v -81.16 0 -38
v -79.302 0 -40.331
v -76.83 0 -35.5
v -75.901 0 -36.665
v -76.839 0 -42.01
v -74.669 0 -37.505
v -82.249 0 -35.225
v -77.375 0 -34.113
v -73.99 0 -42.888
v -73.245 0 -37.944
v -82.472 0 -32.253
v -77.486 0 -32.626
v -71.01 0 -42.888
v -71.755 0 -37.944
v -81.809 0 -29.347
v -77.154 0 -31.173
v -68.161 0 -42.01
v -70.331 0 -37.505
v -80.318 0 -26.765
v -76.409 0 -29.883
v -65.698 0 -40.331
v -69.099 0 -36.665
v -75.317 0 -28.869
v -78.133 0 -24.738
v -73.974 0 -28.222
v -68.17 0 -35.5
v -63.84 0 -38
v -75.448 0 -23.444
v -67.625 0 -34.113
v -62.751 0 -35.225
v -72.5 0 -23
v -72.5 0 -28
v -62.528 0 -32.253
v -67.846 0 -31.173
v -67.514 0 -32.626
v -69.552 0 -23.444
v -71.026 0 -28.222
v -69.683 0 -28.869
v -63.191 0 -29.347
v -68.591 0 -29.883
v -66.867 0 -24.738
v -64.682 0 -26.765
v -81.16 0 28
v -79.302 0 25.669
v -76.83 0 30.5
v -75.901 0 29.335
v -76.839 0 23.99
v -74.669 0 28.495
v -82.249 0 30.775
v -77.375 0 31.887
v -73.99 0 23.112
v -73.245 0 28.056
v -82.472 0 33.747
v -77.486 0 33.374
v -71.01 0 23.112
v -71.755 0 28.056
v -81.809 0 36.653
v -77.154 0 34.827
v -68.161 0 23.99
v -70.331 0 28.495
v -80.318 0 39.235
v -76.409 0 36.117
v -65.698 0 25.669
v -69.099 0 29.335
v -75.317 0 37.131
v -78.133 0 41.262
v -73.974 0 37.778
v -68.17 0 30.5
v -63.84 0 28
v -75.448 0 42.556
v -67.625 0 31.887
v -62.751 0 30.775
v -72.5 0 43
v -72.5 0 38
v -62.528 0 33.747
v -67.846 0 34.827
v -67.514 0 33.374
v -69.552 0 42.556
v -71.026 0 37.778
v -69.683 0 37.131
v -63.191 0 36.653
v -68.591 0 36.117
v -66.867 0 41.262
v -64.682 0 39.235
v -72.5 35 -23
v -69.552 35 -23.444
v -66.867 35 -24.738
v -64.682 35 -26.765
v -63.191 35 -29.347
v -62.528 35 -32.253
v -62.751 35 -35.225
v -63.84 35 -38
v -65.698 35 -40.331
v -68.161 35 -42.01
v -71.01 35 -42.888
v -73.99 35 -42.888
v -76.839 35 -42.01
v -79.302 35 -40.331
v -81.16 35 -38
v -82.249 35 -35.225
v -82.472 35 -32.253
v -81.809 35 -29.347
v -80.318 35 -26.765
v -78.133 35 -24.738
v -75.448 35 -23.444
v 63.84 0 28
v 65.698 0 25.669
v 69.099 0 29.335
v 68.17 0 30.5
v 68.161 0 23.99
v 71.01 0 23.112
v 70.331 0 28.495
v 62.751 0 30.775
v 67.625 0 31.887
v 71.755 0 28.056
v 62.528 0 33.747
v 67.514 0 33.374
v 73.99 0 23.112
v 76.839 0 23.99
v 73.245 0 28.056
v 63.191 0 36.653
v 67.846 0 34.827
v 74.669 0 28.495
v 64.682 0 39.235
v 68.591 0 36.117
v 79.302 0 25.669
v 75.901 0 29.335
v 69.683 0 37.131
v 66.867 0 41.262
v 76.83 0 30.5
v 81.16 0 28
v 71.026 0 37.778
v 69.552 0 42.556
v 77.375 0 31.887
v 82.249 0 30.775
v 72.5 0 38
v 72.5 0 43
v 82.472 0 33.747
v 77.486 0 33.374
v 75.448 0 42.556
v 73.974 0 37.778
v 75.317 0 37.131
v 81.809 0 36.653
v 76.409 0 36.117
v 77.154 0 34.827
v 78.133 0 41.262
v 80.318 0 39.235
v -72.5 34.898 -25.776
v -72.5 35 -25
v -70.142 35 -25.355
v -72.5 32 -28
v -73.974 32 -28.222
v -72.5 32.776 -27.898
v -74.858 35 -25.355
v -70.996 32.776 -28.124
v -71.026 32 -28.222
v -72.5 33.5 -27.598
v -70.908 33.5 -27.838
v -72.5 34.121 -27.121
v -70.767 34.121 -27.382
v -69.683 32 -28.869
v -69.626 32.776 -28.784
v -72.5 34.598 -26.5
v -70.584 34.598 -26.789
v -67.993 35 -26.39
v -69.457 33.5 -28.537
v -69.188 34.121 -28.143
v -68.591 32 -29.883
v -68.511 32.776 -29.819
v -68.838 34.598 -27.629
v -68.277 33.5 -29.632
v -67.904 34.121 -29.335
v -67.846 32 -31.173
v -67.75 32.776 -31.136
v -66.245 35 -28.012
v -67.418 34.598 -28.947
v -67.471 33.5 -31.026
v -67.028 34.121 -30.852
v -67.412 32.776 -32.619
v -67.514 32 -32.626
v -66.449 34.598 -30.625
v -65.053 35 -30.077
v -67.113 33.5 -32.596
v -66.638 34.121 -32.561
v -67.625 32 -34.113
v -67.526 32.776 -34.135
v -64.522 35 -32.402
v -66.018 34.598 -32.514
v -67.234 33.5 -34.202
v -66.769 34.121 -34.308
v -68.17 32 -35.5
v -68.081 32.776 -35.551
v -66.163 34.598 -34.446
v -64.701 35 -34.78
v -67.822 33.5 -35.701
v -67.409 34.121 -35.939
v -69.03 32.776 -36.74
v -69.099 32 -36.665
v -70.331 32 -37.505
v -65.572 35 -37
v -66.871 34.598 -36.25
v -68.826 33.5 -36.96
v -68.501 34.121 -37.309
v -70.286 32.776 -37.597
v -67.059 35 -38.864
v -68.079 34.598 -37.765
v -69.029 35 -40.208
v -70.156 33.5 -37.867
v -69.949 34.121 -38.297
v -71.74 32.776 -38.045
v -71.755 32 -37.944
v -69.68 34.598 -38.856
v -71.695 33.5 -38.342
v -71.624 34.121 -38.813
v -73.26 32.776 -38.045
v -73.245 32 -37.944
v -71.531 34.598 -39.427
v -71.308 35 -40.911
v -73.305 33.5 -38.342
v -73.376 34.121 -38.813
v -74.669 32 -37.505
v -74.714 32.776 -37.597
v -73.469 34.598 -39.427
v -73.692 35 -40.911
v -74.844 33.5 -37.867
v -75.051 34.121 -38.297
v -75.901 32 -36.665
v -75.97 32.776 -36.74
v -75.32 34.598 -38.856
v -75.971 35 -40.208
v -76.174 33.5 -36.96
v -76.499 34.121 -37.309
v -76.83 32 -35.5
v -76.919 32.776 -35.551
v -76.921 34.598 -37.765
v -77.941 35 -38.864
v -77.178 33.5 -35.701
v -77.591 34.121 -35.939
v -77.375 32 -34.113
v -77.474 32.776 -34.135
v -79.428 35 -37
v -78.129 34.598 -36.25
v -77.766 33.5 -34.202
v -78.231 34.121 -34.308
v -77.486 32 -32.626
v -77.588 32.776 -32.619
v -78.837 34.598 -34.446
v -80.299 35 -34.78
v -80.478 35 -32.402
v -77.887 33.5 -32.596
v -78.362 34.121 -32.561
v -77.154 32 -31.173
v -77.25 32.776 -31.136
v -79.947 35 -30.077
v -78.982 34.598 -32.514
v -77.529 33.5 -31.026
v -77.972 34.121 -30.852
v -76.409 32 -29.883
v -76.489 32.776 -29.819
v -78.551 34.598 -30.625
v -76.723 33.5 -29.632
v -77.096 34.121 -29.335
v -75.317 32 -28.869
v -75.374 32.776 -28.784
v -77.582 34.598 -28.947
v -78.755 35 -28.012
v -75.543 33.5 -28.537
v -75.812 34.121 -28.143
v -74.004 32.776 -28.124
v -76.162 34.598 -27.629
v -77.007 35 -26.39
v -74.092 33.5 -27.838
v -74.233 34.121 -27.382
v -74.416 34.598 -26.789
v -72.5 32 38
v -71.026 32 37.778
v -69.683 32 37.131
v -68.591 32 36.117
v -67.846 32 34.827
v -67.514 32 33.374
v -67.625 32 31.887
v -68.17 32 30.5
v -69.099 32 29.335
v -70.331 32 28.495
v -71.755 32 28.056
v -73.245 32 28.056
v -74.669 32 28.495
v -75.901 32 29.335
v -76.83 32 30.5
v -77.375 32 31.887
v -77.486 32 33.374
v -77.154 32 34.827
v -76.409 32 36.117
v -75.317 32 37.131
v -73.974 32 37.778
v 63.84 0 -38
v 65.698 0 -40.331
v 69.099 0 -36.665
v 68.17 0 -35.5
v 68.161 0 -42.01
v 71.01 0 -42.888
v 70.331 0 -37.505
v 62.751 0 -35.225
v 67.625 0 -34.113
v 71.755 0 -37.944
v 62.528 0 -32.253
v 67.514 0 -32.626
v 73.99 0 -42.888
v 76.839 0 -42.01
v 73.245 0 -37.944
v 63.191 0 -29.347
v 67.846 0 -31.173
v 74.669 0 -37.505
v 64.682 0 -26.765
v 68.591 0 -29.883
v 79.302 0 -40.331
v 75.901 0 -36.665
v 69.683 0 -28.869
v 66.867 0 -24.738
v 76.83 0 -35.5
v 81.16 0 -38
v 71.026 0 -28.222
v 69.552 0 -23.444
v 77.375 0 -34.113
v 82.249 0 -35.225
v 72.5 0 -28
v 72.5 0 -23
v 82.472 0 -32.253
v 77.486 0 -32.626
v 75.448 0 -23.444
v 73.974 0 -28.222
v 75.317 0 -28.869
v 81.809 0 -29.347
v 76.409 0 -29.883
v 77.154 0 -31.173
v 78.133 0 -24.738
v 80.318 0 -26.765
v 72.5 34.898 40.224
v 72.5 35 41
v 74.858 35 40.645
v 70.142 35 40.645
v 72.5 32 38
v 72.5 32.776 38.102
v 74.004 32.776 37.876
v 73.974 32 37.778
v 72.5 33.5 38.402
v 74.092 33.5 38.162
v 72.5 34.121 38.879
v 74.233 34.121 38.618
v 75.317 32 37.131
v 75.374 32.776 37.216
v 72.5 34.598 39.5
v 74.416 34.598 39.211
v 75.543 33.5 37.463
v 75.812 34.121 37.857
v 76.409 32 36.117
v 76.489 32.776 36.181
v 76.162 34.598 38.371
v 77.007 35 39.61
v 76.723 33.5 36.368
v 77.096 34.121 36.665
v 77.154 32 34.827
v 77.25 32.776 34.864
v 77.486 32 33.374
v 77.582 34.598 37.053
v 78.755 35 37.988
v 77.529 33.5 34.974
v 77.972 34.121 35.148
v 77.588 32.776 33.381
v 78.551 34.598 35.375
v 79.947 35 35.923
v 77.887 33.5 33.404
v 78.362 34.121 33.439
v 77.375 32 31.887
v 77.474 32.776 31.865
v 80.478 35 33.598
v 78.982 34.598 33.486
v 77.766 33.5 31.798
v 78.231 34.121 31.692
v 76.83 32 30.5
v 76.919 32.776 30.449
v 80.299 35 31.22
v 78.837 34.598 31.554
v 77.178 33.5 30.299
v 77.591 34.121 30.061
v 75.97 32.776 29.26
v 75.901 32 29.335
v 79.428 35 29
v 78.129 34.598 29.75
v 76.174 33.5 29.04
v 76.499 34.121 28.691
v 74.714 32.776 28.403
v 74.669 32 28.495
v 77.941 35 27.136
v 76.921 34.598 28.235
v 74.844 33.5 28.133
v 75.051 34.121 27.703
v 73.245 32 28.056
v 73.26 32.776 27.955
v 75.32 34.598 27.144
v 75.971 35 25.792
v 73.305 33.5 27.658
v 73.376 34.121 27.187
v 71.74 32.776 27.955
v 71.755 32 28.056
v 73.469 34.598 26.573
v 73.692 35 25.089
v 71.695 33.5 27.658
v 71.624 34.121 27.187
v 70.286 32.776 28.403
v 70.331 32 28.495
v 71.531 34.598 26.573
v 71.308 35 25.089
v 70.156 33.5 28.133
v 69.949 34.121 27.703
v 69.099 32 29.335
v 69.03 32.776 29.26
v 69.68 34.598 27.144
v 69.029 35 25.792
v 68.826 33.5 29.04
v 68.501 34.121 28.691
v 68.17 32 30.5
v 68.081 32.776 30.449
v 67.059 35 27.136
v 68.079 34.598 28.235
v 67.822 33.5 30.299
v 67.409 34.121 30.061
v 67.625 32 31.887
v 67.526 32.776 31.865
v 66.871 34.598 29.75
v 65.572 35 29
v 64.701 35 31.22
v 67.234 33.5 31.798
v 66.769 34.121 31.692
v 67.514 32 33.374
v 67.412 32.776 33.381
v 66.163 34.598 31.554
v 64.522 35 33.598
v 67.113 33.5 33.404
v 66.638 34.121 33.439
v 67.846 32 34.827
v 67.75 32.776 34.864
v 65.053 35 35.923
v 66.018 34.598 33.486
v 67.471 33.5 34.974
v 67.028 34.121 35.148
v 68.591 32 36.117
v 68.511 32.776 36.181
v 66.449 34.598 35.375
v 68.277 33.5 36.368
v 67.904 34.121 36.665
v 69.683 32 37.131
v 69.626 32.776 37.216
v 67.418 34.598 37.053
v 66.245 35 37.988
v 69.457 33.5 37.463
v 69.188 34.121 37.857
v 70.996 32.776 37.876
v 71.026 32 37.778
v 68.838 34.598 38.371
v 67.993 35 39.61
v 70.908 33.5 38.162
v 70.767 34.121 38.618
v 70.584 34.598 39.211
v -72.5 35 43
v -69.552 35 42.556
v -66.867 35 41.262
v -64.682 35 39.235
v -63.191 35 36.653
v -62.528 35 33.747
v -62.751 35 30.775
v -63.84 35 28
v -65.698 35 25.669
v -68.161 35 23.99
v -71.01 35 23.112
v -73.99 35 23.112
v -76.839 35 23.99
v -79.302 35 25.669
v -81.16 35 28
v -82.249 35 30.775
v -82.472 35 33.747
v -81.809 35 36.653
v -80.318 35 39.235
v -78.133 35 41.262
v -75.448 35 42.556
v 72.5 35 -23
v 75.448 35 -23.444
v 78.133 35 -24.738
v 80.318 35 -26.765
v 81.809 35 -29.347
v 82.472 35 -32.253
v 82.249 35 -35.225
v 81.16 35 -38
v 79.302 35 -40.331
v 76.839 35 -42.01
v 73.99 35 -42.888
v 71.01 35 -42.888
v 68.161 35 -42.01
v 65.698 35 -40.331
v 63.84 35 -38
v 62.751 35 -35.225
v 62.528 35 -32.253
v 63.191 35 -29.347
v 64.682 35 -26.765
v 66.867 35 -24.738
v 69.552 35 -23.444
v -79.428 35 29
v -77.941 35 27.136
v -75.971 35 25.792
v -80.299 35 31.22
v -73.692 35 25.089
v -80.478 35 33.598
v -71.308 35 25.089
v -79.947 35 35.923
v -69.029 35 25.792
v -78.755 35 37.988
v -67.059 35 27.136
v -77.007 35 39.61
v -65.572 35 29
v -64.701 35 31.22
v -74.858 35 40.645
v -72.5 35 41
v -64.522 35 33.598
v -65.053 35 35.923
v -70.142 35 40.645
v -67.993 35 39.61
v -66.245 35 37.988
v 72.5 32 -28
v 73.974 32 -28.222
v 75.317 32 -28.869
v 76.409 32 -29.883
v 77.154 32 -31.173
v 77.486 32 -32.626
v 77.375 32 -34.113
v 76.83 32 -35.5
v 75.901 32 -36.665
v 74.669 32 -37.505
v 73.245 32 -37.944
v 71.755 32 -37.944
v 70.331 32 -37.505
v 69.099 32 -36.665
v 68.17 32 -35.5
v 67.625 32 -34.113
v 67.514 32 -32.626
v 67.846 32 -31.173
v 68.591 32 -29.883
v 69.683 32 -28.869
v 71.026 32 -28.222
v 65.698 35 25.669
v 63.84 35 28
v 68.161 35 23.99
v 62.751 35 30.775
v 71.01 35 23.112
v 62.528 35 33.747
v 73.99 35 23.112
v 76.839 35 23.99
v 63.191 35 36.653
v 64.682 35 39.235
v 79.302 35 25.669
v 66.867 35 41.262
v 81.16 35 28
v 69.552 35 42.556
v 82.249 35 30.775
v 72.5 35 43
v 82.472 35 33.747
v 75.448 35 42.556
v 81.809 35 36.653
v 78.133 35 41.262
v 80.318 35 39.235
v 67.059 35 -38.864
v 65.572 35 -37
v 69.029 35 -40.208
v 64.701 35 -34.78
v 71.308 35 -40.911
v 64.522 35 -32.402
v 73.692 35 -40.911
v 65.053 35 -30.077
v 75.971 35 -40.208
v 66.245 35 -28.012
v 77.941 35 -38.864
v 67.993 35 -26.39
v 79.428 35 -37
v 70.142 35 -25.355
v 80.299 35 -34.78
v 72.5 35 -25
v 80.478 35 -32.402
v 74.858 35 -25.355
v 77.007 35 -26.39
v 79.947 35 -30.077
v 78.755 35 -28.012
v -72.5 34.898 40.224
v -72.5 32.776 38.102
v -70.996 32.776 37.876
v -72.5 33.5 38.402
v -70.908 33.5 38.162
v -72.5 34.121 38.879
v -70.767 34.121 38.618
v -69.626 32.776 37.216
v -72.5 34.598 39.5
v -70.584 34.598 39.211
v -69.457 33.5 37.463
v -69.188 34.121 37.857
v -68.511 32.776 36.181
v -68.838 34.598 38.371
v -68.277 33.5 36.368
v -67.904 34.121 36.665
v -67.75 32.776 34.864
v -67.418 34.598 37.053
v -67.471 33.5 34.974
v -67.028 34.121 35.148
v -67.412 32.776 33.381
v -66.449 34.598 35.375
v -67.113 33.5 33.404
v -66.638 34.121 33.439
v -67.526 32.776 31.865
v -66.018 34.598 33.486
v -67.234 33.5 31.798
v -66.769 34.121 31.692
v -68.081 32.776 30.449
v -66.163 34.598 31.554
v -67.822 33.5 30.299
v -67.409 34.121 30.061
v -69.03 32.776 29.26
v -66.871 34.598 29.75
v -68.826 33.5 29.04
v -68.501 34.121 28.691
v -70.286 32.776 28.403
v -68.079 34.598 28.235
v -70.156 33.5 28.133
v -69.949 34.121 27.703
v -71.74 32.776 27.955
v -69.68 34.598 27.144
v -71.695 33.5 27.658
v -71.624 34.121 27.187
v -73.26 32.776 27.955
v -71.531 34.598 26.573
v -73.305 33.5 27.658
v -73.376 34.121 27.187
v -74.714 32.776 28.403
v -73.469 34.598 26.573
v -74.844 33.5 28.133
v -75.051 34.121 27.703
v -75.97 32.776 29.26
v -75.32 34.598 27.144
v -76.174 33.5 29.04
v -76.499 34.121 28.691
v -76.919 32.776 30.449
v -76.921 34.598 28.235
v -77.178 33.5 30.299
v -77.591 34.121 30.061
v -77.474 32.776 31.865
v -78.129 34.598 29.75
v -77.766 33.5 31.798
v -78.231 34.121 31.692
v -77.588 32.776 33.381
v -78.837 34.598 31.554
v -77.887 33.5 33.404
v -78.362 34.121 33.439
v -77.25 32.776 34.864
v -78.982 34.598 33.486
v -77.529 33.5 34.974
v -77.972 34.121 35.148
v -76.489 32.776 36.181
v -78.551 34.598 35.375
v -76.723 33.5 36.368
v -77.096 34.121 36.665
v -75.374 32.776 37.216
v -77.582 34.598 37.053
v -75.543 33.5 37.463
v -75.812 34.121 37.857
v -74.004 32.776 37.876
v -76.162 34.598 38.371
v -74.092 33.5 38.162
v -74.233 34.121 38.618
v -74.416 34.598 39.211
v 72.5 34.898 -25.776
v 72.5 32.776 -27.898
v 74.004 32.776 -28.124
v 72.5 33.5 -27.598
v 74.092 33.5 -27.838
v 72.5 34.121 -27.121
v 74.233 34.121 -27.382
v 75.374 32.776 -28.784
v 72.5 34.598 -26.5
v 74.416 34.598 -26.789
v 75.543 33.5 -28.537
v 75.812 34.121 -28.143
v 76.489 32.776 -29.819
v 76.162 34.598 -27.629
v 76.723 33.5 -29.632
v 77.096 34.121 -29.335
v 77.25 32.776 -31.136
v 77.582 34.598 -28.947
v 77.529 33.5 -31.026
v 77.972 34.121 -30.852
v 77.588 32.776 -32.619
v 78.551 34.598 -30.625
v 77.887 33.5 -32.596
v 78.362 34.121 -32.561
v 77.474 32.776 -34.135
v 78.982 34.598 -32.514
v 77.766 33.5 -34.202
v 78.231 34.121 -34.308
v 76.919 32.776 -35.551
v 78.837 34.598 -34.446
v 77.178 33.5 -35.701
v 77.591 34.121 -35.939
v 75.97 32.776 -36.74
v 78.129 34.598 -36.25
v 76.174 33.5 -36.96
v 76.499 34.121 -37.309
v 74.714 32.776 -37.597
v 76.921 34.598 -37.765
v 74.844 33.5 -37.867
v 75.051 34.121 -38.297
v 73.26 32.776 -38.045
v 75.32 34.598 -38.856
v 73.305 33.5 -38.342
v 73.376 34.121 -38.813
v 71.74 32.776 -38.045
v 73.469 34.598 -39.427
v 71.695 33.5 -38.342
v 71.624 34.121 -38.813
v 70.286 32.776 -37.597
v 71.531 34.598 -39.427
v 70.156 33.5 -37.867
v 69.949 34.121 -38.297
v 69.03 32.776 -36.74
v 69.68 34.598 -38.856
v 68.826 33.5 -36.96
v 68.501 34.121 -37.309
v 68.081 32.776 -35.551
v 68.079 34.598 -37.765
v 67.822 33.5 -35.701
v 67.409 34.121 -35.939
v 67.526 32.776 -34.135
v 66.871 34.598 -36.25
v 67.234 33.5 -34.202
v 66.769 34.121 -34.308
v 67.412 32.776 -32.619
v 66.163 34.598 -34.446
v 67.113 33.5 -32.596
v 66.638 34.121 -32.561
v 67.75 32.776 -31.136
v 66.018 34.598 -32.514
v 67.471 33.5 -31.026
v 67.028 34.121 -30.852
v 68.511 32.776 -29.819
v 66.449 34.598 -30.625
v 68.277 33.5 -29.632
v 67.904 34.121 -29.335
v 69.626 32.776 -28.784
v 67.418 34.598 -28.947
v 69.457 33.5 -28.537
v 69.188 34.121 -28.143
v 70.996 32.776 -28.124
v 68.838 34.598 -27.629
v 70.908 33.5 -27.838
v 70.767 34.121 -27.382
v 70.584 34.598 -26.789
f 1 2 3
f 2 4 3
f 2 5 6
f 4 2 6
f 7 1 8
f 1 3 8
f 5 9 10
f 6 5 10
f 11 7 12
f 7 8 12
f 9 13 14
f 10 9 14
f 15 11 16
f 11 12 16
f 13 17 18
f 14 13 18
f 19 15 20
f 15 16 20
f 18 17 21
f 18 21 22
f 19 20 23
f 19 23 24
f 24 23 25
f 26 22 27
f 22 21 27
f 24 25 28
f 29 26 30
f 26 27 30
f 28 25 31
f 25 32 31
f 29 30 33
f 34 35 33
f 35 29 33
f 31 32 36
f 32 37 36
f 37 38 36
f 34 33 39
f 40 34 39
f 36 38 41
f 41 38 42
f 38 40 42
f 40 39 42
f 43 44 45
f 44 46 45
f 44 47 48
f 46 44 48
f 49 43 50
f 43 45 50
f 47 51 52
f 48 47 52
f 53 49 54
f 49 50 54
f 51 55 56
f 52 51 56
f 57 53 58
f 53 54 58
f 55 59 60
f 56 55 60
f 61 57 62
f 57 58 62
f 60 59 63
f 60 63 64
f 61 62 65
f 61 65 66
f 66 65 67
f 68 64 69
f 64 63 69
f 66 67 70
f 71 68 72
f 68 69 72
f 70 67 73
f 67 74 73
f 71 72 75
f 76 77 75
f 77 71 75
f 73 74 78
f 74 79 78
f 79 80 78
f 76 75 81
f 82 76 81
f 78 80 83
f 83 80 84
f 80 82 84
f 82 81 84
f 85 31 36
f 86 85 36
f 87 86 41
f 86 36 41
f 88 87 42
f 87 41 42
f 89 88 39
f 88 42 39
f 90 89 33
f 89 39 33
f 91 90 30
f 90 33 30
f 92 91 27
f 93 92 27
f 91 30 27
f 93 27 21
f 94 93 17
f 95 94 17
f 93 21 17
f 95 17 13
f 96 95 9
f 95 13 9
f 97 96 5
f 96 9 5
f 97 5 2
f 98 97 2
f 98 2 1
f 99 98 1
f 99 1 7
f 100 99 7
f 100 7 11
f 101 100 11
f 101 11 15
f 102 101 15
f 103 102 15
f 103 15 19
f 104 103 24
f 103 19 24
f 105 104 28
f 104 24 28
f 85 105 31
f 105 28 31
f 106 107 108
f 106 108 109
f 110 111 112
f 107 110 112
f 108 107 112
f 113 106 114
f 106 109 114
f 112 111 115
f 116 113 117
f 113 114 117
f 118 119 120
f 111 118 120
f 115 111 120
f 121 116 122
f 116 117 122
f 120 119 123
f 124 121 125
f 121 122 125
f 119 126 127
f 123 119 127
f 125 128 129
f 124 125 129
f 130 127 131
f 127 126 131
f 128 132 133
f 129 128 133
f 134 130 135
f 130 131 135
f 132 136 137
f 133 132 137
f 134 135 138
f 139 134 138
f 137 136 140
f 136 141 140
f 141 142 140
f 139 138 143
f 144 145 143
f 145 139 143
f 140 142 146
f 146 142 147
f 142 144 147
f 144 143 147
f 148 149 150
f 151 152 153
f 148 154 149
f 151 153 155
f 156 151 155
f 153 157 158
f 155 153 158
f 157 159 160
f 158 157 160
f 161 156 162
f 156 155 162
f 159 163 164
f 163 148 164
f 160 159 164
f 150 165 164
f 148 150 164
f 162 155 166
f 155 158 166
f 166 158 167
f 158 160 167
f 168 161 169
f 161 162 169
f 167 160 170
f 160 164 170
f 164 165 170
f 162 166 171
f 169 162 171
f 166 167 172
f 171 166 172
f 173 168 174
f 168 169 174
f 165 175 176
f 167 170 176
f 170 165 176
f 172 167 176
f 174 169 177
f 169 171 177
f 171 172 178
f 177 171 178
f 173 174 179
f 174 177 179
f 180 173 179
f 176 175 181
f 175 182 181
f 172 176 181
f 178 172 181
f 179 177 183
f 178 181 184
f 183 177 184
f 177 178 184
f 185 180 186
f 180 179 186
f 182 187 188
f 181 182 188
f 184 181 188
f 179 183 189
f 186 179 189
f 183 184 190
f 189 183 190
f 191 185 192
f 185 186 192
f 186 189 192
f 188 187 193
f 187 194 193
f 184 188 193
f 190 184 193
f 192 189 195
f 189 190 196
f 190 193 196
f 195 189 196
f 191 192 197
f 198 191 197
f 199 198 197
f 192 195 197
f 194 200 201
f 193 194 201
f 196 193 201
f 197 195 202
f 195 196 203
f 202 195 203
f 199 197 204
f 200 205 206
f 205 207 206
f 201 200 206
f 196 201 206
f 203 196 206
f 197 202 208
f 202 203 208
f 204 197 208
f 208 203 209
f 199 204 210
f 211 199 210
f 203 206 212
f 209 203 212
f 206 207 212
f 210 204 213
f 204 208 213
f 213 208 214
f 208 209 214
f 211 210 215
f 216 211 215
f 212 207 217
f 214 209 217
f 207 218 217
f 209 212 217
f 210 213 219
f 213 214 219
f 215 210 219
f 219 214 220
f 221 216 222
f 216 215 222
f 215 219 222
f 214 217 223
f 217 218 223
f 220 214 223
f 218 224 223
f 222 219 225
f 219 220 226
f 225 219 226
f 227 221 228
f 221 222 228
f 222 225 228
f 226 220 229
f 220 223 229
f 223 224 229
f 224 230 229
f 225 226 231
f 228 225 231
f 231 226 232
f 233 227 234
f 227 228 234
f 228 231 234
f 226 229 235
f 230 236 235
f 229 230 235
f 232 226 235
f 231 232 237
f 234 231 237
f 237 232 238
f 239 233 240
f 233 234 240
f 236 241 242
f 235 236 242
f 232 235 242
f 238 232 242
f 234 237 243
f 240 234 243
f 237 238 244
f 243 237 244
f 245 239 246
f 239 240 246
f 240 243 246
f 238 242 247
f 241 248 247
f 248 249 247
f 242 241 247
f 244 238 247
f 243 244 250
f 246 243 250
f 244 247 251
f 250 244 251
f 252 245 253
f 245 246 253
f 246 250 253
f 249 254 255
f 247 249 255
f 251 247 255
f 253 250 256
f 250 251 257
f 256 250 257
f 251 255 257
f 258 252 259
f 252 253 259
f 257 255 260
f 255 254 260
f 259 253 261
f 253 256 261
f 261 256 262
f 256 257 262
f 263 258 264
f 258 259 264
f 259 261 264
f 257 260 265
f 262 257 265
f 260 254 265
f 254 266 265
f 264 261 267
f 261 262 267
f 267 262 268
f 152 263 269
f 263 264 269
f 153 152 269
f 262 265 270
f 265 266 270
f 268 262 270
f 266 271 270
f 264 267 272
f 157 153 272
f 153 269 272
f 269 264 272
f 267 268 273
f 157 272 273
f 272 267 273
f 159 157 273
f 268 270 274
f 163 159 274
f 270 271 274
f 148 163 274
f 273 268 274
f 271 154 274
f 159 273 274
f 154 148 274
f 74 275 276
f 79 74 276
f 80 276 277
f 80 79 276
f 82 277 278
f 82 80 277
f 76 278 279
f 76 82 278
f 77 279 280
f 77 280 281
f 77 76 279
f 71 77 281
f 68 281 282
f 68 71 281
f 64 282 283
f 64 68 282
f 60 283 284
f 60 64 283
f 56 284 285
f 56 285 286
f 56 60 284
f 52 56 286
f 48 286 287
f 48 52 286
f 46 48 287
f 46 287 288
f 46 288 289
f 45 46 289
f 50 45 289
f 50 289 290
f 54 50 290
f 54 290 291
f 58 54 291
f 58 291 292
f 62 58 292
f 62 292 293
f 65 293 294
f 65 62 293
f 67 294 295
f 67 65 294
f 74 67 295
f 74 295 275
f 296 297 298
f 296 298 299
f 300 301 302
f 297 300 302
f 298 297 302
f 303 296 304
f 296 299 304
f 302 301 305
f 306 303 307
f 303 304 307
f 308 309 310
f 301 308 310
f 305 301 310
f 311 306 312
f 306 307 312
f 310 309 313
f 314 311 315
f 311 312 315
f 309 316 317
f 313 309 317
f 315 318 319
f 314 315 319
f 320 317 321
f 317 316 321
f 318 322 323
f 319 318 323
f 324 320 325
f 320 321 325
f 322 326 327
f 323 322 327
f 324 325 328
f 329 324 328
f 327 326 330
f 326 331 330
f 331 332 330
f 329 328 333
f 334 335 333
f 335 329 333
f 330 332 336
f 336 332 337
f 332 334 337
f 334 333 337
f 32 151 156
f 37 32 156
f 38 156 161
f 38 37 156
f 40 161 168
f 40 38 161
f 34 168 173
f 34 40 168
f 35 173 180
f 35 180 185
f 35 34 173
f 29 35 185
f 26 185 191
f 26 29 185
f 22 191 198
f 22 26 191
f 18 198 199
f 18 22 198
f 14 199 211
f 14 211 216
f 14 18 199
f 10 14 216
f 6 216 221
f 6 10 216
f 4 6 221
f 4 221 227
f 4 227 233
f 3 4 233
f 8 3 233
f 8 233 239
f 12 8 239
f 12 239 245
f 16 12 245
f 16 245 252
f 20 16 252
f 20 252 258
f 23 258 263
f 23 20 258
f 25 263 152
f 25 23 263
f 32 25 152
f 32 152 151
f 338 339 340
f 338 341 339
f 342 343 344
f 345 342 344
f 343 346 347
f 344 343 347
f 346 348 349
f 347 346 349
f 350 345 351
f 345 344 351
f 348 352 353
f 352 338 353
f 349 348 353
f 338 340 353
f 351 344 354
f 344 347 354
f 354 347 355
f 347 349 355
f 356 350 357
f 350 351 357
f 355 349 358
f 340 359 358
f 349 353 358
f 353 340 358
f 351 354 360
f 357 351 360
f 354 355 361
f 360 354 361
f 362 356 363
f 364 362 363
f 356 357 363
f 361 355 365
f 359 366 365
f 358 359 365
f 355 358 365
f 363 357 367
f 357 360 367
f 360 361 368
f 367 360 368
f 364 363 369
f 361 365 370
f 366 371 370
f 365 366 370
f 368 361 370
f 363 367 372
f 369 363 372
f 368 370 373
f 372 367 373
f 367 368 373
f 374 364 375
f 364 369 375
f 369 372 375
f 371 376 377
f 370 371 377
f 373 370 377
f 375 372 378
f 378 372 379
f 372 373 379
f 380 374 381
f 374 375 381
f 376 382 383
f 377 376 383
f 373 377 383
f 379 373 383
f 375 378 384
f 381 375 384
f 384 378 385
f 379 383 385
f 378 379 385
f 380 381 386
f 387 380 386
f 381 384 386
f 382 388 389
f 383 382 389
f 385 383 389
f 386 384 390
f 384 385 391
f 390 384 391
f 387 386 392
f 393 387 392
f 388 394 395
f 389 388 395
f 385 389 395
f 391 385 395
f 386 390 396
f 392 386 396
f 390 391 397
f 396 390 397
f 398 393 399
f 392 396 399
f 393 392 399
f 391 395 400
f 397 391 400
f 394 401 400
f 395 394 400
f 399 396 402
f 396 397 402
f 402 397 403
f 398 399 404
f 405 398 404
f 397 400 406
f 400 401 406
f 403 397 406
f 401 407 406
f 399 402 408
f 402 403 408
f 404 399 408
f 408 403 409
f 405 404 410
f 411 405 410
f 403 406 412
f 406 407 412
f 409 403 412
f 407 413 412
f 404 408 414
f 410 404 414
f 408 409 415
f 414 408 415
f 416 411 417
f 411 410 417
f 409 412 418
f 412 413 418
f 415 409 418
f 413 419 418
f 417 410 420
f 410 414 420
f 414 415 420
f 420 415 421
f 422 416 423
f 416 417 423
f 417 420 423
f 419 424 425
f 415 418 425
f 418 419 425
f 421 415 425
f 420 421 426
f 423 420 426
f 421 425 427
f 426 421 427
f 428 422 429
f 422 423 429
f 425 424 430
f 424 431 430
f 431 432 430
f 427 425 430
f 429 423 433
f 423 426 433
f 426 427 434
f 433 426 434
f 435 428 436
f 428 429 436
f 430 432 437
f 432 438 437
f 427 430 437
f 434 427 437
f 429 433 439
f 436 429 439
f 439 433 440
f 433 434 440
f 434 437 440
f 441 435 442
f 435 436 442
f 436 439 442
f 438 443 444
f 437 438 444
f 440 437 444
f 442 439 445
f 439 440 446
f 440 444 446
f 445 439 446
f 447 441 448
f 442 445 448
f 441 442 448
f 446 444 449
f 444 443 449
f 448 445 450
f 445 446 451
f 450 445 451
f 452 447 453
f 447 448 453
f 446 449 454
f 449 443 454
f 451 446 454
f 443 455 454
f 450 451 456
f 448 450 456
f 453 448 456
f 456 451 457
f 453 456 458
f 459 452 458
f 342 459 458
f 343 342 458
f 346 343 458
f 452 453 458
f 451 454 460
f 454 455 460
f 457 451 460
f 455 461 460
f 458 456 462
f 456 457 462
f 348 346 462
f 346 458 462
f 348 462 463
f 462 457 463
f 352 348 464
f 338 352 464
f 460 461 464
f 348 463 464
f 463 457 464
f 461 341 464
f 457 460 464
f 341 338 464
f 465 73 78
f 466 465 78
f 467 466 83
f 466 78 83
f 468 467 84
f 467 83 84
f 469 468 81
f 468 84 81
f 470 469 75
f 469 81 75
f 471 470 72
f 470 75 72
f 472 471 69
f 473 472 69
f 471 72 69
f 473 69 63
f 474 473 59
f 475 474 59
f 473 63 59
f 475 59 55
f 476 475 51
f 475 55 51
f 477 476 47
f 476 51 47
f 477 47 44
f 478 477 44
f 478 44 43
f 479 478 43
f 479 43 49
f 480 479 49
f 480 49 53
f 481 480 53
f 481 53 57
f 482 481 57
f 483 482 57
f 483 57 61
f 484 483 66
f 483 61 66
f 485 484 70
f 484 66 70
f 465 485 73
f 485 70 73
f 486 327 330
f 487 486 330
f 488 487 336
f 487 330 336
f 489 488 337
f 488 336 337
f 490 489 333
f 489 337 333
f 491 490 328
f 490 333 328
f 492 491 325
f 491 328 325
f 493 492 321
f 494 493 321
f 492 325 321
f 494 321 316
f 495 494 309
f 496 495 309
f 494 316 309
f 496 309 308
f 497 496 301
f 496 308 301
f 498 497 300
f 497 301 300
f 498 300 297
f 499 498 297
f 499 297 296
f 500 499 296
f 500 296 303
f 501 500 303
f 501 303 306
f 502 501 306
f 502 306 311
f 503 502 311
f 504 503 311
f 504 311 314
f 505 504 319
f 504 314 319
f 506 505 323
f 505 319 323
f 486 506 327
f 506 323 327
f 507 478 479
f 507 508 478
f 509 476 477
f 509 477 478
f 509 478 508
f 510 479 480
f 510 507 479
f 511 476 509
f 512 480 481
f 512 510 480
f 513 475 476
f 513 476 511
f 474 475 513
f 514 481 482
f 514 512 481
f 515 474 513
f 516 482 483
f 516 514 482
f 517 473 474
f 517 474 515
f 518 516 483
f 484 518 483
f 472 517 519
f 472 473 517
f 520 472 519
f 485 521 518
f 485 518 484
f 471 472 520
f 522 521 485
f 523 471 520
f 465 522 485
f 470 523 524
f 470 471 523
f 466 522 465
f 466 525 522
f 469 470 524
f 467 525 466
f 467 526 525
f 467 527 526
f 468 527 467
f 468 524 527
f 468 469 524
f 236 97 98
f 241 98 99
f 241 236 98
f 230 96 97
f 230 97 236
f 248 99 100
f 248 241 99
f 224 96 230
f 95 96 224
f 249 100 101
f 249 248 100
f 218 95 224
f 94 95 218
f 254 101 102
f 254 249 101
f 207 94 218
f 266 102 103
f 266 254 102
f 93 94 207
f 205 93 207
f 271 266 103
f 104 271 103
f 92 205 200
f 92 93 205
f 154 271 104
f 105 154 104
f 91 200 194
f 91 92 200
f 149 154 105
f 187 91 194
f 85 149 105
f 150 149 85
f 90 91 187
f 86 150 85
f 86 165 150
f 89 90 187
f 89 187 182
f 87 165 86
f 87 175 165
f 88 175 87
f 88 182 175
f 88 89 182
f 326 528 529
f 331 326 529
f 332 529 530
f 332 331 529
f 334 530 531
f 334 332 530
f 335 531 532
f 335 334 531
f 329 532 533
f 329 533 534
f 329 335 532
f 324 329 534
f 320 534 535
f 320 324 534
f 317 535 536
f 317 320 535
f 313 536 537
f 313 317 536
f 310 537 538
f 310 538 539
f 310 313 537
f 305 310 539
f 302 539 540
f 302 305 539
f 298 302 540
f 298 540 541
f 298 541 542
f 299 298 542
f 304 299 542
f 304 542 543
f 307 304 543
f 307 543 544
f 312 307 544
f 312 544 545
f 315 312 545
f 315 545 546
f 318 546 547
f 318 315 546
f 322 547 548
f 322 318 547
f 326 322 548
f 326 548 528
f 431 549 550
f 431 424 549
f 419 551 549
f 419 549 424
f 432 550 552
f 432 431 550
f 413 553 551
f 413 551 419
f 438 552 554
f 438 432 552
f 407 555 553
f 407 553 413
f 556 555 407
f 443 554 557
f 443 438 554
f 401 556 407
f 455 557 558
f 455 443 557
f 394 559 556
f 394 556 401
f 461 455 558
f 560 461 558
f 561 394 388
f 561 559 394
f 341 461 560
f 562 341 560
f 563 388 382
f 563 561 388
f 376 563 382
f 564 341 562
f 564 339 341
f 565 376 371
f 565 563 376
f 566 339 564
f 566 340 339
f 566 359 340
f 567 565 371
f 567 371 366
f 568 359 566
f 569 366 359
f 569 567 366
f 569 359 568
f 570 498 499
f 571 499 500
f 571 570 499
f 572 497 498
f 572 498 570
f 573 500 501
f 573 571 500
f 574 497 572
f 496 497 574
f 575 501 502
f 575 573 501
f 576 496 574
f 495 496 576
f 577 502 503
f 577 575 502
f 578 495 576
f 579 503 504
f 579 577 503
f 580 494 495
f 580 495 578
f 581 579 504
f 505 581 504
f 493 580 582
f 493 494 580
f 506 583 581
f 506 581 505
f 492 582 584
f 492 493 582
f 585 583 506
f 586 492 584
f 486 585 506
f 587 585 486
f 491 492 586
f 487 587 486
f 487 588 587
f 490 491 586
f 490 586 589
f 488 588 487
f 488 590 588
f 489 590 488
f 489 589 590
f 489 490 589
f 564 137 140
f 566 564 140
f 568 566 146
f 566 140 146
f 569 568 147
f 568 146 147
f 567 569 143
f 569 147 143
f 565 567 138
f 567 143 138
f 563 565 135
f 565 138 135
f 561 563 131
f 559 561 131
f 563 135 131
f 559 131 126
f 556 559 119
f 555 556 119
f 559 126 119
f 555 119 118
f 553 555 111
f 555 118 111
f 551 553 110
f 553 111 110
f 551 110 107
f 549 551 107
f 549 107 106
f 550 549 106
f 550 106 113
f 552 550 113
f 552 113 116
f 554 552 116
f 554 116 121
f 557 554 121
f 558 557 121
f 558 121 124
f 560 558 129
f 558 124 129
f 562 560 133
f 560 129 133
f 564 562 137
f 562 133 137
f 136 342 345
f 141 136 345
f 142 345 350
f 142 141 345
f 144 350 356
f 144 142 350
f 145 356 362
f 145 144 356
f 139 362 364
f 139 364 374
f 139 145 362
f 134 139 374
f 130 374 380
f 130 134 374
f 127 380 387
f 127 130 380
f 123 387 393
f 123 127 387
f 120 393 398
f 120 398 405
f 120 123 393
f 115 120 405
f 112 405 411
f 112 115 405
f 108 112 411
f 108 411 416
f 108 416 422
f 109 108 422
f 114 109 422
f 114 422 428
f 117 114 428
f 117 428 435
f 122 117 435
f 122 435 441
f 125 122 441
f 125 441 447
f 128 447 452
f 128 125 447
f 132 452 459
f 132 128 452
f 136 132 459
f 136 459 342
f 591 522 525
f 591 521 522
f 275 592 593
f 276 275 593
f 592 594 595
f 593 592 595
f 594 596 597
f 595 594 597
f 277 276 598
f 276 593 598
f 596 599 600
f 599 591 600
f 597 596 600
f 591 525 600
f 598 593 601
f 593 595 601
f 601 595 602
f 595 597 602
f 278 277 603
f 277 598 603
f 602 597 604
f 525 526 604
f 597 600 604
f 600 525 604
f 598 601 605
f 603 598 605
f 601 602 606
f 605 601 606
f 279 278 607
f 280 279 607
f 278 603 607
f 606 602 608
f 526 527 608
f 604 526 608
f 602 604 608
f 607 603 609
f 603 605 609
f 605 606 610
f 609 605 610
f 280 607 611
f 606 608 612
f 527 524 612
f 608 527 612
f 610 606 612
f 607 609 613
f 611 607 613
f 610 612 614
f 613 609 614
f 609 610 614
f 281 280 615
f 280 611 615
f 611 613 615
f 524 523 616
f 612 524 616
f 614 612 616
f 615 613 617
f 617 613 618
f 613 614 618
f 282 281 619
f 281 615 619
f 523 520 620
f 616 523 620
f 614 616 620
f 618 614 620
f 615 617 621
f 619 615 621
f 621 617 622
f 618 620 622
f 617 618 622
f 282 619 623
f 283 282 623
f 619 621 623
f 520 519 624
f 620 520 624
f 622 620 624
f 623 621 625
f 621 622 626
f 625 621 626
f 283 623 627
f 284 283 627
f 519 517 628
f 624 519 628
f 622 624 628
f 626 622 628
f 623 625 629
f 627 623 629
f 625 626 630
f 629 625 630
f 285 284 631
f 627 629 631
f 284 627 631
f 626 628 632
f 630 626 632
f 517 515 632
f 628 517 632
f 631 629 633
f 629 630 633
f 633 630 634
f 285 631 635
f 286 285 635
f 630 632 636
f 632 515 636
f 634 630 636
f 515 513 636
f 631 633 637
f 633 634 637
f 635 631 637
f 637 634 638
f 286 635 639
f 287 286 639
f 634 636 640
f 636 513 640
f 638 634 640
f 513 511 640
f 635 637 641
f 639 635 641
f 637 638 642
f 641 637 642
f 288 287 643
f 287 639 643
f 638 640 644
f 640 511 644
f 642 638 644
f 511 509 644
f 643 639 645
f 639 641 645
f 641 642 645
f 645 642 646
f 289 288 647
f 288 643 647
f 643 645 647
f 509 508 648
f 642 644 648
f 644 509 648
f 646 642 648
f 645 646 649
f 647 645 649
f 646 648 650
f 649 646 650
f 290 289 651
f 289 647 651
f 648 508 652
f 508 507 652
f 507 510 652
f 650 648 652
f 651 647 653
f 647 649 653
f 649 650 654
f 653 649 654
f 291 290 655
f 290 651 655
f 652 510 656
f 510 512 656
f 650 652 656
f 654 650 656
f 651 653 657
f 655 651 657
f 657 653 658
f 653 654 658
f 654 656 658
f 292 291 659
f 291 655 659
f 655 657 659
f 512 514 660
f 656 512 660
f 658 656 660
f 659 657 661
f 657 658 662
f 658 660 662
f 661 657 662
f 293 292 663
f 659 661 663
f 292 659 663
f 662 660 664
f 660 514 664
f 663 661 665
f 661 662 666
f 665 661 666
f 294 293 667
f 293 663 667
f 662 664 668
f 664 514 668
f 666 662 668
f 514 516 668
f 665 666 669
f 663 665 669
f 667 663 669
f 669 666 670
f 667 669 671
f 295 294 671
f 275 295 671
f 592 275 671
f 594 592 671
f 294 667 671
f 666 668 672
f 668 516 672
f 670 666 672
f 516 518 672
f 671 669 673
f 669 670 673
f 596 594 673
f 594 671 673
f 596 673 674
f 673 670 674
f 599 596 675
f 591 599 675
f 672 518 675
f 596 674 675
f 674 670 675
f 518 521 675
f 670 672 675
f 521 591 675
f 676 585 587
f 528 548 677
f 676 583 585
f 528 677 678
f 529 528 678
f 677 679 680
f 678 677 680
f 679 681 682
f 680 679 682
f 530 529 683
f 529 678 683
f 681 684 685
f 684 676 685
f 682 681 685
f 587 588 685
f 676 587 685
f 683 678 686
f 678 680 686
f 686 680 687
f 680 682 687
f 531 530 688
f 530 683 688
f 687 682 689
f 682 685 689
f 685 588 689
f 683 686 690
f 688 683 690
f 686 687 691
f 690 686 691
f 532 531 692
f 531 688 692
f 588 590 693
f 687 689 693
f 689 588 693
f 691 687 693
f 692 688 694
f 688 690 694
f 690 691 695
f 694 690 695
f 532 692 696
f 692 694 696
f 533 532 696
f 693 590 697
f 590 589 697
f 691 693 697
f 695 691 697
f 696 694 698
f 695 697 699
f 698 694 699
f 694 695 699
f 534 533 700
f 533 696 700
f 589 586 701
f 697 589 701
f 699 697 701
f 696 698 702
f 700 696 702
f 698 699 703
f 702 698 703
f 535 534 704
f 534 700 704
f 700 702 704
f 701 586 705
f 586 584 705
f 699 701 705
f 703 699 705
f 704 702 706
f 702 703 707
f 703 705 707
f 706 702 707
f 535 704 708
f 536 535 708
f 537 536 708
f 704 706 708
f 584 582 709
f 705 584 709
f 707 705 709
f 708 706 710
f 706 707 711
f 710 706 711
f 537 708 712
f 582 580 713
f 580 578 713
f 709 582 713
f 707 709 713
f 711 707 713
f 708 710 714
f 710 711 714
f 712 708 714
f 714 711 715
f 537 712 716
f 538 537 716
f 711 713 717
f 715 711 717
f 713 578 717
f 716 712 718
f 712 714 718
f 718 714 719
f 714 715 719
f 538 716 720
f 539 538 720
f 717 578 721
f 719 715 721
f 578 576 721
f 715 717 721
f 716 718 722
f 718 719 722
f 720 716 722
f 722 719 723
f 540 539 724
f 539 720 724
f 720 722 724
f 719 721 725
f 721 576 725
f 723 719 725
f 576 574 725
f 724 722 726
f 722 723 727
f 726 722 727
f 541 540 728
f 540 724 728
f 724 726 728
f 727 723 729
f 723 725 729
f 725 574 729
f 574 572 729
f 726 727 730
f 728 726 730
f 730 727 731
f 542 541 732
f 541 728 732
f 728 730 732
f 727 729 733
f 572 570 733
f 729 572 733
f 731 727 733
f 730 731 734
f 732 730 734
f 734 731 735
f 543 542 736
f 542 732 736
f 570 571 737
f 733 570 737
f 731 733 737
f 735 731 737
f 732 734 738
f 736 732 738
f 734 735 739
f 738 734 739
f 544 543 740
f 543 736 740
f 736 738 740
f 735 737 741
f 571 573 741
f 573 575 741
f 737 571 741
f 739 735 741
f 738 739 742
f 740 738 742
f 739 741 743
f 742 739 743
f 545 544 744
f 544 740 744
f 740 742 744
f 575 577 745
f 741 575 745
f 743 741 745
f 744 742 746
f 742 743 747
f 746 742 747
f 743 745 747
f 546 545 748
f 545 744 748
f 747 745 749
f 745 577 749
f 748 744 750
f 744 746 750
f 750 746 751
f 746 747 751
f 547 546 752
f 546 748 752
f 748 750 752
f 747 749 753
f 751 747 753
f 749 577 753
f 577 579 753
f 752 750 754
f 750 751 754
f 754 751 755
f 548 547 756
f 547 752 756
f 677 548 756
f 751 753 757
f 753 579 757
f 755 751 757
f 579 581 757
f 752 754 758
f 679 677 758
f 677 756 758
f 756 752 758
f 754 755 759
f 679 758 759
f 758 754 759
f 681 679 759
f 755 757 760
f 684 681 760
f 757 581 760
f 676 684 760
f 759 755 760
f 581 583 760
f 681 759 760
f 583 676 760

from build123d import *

# Parameters (mm, degrees)
SKETCH1_R             = 10
SKETCH1_R_2           = 5
BOSS_EXTRUDE1_DEPTH   = 35
BOSS_EXTRUDE1_2_DEPTH = 35
BOSS_EXTRUDE1_3_DEPTH = 35
BOSS_EXTRUDE1_4_DEPTH = 35
FILLET2_R             = 3
FILLET3_R             = 3
FILLET4_R             = 3
FILLET5_R             = 3


with BuildPart() as part:
    # Sketch1 → Boss-Extrude1 (new body)
    with BuildSketch(Plane(origin=(0, 0, 0), x_dir=(1, 0, 0), z_dir=(0, 1, 0))):
        with Locations(Location((-72.5, -33, 0), (0, 0, 270))):
            Circle(SKETCH1_R)
        with Locations(Location((-72.5, -33, 0), (0, 0, 270))):
            Circle(SKETCH1_R_2, mode=Mode.SUBTRACT)
    extrude(amount=BOSS_EXTRUDE1_DEPTH)

    # Fillet4
    fillet4_edges = [part.edges().sort_by_distance(p)[0] for p in [
        (-72.5, 35, 28),
    ]]
    fillet(fillet4_edges, radius=FILLET4_R)


with BuildPart() as body_2:
    # Sketch1 → Boss-Extrude1 2 (new body)
    with BuildSketch(Plane(origin=(0, 0, 0), x_dir=(1, 0, 0), z_dir=(0, 1, 0))):
        with Locations(Location((-72.5, 33, 0), (0, 0, 270))):
            Circle(SKETCH1_R)
        with Locations(Location((-72.5, 33, 0), (0, 0, 270))):
            Circle(SKETCH1_R_2, mode=Mode.SUBTRACT)
    extrude(amount=BOSS_EXTRUDE1_2_DEPTH)

    # Fillet3
    fillet3_edges = [body_2.edges().sort_by_distance(p)[0] for p in [
        (-72.5, 35, -38),
    ]]
    fillet(fillet3_edges, radius=FILLET3_R)


with BuildPart() as body_3:
    # Sketch1 → Boss-Extrude1 3 (new body)
    with BuildSketch(Plane(origin=(0, 0, 0), x_dir=(1, 0, 0), z_dir=(0, 1, 0))):
        with Locations(Location((72.5, -33, 0), (0, 0, 270))):
            Circle(SKETCH1_R)
        with Locations(Location((72.5, -33, 0), (0, 0, 270))):
            Circle(SKETCH1_R_2, mode=Mode.SUBTRACT)
    extrude(amount=BOSS_EXTRUDE1_3_DEPTH)

    # Fillet5
    fillet5_edges = [body_3.edges().sort_by_distance(p)[0] for p in [
        (72.5, 35, 28),
    ]]
    fillet(fillet5_edges, radius=FILLET5_R)


with BuildPart() as body_4:
    # Sketch1 → Boss-Extrude1 4 (new body)
    with BuildSketch(Plane(origin=(0, 0, 0), x_dir=(1, 0, 0), z_dir=(0, 1, 0))):
        with Locations(Location((72.5, 33, 0), (0, 0, 270))):
            Circle(SKETCH1_R)
        with Locations(Location((72.5, 33, 0), (0, 0, 270))):
            Circle(SKETCH1_R_2, mode=Mode.SUBTRACT)
    extrude(amount=BOSS_EXTRUDE1_4_DEPTH)

    # Fillet2
    fillet2_edges = [body_4.edges().sort_by_distance(p)[0] for p in [
        (72.5, 35, -38),
    ]]
    fillet(fillet2_edges, radius=FILLET2_R)


solid = Compound([part.part, body_2.part, body_3.part, body_4.part])
